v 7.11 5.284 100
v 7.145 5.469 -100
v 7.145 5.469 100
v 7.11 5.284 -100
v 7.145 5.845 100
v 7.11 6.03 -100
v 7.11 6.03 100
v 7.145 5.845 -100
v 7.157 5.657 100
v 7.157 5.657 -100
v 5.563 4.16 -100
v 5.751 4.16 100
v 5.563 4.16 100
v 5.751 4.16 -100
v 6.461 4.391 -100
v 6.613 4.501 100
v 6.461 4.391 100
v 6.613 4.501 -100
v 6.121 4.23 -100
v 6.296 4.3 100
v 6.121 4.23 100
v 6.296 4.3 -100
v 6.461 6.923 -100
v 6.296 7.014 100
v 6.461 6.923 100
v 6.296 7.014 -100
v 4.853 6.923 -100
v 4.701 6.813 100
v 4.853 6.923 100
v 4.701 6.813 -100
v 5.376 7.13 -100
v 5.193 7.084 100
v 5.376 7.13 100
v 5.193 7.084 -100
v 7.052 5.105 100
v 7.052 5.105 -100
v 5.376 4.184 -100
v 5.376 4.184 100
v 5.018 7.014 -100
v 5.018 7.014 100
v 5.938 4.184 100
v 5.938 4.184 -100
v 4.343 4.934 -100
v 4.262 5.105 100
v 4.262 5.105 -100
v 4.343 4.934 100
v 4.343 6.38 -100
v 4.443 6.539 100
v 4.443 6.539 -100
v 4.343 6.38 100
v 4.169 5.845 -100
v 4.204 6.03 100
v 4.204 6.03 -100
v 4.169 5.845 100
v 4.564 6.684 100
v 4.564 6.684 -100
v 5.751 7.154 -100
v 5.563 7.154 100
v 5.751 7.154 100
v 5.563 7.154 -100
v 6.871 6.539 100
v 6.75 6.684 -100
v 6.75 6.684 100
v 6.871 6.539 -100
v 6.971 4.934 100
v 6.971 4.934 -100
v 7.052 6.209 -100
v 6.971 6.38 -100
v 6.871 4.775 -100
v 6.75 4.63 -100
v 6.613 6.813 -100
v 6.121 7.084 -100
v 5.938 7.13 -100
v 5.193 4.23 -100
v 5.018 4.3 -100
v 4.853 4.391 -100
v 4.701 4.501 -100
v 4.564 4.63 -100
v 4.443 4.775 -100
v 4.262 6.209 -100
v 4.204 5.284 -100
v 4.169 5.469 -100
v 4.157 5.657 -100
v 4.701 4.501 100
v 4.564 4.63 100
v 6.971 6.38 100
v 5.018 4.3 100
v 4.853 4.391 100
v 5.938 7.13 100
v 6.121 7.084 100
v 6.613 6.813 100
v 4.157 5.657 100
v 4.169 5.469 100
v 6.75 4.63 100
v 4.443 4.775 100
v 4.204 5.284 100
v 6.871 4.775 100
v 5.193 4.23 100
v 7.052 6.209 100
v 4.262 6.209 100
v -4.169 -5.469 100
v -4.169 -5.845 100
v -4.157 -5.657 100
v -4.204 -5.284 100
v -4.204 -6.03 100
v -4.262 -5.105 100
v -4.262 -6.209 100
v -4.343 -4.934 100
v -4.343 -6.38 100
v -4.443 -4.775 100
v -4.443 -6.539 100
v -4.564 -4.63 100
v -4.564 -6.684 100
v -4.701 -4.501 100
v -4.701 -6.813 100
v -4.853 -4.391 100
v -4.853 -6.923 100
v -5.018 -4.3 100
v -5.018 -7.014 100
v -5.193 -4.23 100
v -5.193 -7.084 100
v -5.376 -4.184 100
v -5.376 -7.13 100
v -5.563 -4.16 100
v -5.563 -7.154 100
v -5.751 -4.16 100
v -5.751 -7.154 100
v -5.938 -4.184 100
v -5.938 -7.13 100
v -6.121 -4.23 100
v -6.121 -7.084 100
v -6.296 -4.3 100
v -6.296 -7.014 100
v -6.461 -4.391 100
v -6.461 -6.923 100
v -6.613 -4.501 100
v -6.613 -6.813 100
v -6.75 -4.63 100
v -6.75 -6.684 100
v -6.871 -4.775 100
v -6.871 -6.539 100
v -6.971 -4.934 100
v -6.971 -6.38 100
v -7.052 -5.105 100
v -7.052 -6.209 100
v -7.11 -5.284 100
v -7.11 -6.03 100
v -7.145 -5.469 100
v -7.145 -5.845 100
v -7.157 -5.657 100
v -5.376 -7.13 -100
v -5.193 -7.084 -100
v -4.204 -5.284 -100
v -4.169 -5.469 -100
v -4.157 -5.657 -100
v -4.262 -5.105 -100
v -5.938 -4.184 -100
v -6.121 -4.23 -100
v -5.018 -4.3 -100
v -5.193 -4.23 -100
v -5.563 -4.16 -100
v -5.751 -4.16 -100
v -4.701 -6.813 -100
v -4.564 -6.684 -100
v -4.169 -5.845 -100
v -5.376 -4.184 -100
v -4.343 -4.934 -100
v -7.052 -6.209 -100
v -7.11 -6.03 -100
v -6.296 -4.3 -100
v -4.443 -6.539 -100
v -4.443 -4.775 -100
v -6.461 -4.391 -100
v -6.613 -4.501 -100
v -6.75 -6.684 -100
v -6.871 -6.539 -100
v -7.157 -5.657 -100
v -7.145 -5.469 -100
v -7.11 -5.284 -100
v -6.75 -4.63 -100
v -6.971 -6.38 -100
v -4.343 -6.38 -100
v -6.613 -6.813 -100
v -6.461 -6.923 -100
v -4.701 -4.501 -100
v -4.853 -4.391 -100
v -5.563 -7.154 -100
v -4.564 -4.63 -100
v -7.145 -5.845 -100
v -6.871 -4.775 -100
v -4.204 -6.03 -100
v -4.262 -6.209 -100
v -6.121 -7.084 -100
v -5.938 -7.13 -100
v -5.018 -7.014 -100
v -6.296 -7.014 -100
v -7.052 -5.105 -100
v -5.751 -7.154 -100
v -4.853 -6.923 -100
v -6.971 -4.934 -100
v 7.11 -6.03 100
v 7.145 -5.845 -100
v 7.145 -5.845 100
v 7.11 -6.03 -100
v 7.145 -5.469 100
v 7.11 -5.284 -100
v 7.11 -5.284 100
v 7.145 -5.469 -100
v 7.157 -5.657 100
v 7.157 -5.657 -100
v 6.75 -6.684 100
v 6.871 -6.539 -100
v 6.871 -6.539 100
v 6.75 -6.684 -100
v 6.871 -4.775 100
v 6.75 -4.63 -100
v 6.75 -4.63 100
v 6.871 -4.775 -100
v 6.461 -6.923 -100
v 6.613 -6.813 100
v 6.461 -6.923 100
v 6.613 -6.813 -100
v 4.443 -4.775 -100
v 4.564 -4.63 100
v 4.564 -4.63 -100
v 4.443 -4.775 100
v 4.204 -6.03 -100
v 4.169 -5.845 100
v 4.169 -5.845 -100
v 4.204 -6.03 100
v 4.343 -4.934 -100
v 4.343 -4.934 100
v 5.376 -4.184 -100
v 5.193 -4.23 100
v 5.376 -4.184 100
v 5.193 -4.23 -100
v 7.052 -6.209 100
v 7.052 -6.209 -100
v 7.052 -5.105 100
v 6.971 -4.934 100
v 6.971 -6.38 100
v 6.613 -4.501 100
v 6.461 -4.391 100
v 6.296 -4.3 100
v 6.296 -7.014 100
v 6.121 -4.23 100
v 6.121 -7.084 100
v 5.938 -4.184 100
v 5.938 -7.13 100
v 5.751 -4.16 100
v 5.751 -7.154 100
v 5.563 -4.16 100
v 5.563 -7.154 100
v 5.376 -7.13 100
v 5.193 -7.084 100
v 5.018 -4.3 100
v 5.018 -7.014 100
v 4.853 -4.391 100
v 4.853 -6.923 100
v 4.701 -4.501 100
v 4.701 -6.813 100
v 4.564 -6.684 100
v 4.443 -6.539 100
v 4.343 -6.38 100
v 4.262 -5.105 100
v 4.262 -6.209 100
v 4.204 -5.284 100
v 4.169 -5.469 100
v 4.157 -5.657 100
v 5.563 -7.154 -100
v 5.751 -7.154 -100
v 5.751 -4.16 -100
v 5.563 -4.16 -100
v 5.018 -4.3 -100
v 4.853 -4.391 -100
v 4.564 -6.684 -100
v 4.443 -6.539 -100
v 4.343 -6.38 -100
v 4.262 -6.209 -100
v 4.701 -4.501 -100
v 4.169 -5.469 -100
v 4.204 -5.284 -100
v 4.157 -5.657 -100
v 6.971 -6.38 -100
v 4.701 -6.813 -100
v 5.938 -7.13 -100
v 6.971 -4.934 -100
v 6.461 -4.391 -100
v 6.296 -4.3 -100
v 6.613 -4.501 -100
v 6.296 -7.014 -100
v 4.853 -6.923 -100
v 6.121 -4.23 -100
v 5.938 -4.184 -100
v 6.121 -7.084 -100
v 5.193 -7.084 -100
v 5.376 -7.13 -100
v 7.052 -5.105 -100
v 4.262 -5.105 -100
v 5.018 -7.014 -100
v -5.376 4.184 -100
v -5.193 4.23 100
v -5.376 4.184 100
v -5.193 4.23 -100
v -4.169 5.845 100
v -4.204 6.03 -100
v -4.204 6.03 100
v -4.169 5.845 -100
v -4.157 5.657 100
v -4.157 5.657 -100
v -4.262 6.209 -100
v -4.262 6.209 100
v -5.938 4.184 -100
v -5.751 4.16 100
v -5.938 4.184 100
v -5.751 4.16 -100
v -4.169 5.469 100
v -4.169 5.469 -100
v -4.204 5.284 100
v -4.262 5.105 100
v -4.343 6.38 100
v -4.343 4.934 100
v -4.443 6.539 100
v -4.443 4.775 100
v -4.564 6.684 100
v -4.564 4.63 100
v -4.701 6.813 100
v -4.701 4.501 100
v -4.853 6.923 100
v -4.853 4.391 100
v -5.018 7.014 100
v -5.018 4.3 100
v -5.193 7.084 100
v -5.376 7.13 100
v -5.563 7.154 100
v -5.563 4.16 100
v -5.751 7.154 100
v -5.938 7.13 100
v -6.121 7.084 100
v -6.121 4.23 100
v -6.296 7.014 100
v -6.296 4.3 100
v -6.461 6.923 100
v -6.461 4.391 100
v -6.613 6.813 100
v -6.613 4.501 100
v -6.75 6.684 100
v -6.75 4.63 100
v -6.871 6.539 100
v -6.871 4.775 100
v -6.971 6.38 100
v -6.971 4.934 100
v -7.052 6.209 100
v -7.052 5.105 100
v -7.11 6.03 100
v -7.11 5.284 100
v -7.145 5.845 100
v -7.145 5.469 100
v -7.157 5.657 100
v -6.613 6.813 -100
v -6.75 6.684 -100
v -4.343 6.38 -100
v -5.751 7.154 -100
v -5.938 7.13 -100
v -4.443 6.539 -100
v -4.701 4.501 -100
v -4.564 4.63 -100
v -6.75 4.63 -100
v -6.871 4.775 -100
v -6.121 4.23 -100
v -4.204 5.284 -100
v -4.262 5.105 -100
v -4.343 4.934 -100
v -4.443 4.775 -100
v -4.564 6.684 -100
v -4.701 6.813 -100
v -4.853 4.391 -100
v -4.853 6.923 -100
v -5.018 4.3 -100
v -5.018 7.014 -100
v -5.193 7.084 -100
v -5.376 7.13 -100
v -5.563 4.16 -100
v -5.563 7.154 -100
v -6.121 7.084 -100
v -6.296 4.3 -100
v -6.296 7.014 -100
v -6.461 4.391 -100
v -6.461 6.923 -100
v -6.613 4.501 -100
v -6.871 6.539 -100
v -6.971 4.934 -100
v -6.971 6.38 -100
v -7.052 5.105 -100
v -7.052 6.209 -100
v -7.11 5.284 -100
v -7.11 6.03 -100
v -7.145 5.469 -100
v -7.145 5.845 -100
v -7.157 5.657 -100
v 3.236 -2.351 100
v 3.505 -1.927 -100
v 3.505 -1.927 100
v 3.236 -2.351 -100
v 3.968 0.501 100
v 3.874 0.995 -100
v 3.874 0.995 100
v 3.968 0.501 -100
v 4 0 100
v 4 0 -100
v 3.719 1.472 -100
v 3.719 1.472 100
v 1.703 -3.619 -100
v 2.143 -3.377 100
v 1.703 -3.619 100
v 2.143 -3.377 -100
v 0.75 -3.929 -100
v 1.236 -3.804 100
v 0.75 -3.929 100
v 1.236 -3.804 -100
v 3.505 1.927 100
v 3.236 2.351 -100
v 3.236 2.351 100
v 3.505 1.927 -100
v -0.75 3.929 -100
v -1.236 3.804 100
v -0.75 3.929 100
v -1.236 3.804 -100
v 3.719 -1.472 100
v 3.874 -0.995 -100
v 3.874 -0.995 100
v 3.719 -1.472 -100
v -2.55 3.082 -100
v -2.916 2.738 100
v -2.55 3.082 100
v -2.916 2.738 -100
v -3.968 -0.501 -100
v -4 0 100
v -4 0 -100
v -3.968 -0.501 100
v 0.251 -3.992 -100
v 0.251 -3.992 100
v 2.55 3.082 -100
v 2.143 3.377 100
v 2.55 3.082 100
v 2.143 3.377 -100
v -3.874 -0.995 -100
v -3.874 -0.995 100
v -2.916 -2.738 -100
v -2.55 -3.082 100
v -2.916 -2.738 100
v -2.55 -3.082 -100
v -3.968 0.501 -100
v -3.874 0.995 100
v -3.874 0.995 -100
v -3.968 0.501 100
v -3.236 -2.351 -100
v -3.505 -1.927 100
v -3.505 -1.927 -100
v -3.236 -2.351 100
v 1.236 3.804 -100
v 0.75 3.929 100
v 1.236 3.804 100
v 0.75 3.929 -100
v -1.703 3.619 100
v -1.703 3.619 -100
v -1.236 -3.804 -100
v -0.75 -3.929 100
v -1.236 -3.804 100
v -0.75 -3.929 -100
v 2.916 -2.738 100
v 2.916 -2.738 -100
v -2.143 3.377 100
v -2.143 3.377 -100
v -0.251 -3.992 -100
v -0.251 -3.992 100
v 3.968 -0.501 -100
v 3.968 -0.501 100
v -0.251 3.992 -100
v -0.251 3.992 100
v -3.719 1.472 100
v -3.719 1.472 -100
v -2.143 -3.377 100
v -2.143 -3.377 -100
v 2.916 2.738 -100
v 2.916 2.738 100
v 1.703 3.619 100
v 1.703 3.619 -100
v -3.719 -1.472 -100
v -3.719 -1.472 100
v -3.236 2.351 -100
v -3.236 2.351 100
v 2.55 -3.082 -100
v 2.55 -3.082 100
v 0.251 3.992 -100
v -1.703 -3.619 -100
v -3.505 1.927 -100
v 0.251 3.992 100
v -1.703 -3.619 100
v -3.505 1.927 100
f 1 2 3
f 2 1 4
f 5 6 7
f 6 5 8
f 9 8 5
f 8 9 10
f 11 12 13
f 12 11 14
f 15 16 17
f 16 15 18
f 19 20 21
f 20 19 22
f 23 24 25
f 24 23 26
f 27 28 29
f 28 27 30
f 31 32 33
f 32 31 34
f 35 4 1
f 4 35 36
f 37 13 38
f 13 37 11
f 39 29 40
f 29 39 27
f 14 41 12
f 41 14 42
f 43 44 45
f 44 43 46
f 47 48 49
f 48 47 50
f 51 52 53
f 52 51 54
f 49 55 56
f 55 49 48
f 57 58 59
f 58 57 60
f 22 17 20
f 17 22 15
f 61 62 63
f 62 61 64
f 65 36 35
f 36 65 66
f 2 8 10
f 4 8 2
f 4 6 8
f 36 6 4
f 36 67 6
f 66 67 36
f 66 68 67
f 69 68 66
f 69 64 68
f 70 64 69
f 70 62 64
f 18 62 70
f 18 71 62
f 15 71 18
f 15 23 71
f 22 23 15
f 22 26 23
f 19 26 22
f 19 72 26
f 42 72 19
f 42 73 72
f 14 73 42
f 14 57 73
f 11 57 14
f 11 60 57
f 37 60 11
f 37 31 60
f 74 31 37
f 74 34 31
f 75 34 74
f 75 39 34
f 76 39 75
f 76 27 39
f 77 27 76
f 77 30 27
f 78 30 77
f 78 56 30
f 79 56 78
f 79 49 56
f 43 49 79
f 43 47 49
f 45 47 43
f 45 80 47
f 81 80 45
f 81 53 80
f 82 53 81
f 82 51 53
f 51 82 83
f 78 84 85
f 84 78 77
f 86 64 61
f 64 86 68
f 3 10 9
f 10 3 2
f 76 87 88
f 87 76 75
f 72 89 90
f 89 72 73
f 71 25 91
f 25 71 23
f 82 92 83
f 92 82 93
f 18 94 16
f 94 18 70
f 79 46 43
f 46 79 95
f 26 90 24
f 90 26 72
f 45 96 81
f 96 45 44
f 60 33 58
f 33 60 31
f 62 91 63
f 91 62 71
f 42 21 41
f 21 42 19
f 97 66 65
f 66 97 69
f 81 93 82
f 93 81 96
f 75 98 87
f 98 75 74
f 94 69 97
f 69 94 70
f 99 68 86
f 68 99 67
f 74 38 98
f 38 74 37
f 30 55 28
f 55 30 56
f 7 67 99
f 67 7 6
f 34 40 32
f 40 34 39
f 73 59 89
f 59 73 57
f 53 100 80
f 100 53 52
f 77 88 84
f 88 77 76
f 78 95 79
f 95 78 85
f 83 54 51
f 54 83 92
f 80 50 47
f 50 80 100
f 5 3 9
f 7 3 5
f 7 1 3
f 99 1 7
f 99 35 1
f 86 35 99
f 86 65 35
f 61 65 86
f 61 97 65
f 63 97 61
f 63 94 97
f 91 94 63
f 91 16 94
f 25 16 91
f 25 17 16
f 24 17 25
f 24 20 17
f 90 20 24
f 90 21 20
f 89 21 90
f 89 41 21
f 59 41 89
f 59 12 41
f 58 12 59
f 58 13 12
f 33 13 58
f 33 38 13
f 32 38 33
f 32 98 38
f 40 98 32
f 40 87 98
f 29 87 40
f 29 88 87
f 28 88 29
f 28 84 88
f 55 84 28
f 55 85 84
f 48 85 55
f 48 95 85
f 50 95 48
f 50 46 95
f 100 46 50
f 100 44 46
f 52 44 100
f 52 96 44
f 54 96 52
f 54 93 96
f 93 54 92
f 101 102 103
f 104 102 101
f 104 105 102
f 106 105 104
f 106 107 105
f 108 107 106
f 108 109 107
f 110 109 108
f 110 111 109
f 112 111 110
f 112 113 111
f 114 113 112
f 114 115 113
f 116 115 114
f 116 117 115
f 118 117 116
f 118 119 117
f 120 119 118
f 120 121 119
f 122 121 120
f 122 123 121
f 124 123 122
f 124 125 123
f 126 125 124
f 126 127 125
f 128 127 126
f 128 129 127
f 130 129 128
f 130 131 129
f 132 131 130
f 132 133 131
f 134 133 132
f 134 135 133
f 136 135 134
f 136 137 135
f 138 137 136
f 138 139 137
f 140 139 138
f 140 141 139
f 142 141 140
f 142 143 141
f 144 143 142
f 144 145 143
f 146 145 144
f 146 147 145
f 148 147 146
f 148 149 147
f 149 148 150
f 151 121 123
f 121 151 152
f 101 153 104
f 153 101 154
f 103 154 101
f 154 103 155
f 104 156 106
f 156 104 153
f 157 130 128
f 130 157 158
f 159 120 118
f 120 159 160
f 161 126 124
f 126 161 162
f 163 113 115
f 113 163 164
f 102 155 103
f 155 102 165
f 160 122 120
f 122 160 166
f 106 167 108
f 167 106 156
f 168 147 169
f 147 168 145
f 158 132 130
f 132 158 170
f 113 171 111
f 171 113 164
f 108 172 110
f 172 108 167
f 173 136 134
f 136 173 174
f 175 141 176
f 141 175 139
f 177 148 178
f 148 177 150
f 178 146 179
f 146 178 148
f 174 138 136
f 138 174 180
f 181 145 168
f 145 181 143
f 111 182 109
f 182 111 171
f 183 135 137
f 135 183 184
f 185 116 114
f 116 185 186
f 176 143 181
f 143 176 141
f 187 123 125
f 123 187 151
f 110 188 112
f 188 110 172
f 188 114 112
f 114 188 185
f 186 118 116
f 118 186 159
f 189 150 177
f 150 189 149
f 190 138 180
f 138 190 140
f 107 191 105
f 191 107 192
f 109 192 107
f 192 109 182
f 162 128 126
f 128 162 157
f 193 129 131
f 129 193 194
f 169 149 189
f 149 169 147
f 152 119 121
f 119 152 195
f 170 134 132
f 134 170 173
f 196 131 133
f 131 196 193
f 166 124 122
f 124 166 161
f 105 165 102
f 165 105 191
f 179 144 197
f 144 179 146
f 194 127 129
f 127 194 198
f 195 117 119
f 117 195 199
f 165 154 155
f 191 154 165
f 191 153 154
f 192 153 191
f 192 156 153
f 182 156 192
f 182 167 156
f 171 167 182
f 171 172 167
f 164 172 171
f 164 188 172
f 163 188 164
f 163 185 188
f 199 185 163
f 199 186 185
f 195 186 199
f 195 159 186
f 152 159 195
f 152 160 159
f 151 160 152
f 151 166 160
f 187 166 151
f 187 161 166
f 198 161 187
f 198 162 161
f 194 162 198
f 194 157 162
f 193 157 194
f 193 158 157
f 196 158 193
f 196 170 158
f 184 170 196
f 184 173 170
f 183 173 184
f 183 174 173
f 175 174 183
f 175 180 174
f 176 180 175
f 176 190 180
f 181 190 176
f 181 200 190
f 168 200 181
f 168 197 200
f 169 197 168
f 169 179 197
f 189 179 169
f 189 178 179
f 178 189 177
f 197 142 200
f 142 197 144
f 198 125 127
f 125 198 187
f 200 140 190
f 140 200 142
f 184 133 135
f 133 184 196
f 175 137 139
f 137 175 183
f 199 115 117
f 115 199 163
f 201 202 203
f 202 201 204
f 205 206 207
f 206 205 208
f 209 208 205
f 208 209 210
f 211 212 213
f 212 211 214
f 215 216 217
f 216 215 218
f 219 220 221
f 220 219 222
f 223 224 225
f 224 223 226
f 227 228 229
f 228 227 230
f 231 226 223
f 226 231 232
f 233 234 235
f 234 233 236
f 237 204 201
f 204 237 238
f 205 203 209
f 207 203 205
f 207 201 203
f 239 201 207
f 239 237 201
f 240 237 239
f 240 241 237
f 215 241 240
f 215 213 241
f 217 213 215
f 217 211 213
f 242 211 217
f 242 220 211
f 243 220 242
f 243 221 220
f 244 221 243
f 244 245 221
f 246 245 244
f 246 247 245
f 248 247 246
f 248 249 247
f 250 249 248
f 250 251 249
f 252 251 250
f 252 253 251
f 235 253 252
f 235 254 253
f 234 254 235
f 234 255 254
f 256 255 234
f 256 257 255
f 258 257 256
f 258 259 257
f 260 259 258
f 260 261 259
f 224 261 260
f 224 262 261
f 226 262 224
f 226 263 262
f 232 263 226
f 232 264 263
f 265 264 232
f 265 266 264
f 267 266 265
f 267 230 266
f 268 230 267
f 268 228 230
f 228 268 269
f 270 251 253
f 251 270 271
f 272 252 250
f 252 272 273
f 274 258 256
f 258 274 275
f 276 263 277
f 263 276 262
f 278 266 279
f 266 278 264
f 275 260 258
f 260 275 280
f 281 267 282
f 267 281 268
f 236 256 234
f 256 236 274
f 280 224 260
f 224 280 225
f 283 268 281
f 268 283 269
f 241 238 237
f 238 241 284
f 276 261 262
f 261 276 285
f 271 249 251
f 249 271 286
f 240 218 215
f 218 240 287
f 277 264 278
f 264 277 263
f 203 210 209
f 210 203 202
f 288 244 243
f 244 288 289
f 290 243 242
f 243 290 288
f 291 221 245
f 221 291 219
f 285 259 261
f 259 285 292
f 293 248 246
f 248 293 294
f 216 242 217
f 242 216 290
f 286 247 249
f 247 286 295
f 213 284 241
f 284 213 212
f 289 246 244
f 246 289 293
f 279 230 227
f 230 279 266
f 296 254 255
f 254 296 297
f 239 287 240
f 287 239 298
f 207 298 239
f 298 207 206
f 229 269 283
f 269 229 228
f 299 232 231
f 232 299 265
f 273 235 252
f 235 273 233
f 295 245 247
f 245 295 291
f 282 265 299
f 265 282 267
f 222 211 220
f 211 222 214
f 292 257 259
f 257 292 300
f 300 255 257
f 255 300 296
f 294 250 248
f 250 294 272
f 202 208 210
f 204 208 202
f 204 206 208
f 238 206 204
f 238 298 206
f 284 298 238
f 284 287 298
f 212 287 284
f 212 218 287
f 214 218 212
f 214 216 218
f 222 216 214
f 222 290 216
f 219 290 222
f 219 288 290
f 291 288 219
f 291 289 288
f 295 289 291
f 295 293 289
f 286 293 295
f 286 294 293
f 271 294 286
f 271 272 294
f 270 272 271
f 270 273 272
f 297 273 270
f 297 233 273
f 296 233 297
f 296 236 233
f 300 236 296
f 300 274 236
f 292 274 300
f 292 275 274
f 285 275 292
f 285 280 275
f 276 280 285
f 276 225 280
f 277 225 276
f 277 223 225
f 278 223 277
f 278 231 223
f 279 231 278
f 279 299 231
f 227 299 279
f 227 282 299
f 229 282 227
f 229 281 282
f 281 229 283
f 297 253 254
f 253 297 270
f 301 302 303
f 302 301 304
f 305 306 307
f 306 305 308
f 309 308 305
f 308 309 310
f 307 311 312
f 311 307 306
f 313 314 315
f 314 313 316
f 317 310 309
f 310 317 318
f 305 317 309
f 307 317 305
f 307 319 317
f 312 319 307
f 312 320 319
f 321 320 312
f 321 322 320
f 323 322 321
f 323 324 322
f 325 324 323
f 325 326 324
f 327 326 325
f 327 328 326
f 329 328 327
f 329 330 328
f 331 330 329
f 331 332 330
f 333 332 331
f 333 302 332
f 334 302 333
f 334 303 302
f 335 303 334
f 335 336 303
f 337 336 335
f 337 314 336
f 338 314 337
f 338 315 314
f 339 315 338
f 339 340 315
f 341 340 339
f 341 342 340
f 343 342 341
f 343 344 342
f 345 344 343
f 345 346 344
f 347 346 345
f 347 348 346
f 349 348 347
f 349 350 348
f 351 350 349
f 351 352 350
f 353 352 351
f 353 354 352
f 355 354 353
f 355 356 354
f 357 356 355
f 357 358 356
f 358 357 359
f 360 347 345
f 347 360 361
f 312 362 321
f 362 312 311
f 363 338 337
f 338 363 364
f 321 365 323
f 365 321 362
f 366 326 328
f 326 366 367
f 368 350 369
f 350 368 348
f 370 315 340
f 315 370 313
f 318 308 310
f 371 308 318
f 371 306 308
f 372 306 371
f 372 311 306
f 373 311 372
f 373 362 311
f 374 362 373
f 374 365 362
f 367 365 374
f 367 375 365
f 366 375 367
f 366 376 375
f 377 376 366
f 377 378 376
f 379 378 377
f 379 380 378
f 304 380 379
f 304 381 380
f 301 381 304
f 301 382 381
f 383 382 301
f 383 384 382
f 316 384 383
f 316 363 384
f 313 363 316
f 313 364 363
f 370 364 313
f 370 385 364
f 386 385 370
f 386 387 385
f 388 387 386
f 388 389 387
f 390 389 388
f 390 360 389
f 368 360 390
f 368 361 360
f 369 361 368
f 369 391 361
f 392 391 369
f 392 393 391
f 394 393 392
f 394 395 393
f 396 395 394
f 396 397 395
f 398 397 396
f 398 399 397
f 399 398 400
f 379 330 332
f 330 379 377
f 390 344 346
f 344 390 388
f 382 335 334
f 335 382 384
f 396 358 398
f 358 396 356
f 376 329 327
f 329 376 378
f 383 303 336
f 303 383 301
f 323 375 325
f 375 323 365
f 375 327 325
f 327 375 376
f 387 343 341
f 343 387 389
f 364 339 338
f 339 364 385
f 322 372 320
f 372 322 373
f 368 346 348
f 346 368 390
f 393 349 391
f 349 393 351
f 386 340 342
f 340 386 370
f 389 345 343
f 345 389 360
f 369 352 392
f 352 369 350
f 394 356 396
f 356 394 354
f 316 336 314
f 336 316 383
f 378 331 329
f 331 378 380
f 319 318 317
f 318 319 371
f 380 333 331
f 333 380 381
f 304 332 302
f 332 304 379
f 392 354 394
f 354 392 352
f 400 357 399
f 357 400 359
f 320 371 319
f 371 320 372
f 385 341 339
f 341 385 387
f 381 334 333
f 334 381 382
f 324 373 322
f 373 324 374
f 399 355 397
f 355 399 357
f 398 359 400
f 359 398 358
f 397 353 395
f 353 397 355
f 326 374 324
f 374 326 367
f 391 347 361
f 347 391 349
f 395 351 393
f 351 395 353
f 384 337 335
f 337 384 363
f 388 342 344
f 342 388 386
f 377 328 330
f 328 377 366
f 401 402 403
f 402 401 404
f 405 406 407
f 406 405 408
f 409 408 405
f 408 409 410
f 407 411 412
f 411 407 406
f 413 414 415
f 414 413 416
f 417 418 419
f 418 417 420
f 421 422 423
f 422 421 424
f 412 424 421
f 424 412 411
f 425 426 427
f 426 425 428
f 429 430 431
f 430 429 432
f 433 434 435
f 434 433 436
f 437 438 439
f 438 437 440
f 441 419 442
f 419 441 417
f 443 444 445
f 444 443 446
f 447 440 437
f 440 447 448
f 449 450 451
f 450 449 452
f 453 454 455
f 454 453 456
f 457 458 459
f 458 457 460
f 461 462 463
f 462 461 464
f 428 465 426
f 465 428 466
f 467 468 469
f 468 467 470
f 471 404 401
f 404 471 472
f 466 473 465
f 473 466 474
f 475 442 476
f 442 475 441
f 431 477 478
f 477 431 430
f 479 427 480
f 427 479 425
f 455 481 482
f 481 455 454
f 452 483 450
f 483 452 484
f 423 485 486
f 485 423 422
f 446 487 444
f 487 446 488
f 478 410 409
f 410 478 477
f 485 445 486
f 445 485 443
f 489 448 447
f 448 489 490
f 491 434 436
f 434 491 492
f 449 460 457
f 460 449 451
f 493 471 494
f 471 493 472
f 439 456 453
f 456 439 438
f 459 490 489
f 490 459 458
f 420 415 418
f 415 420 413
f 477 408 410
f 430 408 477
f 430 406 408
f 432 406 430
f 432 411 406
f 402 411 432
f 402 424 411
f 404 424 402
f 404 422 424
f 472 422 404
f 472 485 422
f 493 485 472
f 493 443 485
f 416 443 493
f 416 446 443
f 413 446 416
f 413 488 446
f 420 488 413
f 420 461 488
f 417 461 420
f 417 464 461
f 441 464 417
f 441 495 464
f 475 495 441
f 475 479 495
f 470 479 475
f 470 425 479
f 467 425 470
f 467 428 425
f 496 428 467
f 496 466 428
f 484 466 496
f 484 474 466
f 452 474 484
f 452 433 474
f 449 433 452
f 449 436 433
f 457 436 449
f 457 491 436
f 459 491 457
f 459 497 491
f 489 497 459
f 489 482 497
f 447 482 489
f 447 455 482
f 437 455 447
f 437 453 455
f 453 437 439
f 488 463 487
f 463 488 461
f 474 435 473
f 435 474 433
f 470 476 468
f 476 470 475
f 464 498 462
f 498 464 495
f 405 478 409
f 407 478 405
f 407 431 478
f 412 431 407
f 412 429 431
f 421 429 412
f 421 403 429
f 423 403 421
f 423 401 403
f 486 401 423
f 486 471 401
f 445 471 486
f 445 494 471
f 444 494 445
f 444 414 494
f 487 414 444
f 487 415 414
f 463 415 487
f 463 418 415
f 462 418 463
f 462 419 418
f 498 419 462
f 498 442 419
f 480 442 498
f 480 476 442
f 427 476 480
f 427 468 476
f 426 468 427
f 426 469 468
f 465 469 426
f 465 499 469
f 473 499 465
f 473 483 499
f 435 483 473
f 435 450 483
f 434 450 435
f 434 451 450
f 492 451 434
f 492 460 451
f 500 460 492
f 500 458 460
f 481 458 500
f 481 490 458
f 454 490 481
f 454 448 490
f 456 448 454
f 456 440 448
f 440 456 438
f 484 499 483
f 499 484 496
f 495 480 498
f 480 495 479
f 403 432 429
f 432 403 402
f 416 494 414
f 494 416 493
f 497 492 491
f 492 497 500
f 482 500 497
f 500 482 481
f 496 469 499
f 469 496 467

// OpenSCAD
$fn = 50;

difference() {
	union() {
		translate(v = [0, 0, 0]) {
			rotate(a = [0, 0, 0]) {
				difference() {
					union() {
						translate(v = [5.657, 5.657, -100.0]) {
							cylinder(h = 200, r = 1.5);
						}
						translate(v = [-5.657, -5.657, -100.0]) {
							cylinder(h = 200, r = 1.5);
						}
						translate(v = [5.657, -5.657, -100.0]) {
							cylinder(h = 200, r = 1.5);
						}
						translate(v = [-5.657, 5.657, -100.0]) {
							cylinder(h = 200, r = 1.5);
						}
						translate(v = [0, 0, -100.0]) {
							cylinder(h = 200, r = 4.0);
						}
					}
					union();
				}
			}
		}
	}
	union();
}
